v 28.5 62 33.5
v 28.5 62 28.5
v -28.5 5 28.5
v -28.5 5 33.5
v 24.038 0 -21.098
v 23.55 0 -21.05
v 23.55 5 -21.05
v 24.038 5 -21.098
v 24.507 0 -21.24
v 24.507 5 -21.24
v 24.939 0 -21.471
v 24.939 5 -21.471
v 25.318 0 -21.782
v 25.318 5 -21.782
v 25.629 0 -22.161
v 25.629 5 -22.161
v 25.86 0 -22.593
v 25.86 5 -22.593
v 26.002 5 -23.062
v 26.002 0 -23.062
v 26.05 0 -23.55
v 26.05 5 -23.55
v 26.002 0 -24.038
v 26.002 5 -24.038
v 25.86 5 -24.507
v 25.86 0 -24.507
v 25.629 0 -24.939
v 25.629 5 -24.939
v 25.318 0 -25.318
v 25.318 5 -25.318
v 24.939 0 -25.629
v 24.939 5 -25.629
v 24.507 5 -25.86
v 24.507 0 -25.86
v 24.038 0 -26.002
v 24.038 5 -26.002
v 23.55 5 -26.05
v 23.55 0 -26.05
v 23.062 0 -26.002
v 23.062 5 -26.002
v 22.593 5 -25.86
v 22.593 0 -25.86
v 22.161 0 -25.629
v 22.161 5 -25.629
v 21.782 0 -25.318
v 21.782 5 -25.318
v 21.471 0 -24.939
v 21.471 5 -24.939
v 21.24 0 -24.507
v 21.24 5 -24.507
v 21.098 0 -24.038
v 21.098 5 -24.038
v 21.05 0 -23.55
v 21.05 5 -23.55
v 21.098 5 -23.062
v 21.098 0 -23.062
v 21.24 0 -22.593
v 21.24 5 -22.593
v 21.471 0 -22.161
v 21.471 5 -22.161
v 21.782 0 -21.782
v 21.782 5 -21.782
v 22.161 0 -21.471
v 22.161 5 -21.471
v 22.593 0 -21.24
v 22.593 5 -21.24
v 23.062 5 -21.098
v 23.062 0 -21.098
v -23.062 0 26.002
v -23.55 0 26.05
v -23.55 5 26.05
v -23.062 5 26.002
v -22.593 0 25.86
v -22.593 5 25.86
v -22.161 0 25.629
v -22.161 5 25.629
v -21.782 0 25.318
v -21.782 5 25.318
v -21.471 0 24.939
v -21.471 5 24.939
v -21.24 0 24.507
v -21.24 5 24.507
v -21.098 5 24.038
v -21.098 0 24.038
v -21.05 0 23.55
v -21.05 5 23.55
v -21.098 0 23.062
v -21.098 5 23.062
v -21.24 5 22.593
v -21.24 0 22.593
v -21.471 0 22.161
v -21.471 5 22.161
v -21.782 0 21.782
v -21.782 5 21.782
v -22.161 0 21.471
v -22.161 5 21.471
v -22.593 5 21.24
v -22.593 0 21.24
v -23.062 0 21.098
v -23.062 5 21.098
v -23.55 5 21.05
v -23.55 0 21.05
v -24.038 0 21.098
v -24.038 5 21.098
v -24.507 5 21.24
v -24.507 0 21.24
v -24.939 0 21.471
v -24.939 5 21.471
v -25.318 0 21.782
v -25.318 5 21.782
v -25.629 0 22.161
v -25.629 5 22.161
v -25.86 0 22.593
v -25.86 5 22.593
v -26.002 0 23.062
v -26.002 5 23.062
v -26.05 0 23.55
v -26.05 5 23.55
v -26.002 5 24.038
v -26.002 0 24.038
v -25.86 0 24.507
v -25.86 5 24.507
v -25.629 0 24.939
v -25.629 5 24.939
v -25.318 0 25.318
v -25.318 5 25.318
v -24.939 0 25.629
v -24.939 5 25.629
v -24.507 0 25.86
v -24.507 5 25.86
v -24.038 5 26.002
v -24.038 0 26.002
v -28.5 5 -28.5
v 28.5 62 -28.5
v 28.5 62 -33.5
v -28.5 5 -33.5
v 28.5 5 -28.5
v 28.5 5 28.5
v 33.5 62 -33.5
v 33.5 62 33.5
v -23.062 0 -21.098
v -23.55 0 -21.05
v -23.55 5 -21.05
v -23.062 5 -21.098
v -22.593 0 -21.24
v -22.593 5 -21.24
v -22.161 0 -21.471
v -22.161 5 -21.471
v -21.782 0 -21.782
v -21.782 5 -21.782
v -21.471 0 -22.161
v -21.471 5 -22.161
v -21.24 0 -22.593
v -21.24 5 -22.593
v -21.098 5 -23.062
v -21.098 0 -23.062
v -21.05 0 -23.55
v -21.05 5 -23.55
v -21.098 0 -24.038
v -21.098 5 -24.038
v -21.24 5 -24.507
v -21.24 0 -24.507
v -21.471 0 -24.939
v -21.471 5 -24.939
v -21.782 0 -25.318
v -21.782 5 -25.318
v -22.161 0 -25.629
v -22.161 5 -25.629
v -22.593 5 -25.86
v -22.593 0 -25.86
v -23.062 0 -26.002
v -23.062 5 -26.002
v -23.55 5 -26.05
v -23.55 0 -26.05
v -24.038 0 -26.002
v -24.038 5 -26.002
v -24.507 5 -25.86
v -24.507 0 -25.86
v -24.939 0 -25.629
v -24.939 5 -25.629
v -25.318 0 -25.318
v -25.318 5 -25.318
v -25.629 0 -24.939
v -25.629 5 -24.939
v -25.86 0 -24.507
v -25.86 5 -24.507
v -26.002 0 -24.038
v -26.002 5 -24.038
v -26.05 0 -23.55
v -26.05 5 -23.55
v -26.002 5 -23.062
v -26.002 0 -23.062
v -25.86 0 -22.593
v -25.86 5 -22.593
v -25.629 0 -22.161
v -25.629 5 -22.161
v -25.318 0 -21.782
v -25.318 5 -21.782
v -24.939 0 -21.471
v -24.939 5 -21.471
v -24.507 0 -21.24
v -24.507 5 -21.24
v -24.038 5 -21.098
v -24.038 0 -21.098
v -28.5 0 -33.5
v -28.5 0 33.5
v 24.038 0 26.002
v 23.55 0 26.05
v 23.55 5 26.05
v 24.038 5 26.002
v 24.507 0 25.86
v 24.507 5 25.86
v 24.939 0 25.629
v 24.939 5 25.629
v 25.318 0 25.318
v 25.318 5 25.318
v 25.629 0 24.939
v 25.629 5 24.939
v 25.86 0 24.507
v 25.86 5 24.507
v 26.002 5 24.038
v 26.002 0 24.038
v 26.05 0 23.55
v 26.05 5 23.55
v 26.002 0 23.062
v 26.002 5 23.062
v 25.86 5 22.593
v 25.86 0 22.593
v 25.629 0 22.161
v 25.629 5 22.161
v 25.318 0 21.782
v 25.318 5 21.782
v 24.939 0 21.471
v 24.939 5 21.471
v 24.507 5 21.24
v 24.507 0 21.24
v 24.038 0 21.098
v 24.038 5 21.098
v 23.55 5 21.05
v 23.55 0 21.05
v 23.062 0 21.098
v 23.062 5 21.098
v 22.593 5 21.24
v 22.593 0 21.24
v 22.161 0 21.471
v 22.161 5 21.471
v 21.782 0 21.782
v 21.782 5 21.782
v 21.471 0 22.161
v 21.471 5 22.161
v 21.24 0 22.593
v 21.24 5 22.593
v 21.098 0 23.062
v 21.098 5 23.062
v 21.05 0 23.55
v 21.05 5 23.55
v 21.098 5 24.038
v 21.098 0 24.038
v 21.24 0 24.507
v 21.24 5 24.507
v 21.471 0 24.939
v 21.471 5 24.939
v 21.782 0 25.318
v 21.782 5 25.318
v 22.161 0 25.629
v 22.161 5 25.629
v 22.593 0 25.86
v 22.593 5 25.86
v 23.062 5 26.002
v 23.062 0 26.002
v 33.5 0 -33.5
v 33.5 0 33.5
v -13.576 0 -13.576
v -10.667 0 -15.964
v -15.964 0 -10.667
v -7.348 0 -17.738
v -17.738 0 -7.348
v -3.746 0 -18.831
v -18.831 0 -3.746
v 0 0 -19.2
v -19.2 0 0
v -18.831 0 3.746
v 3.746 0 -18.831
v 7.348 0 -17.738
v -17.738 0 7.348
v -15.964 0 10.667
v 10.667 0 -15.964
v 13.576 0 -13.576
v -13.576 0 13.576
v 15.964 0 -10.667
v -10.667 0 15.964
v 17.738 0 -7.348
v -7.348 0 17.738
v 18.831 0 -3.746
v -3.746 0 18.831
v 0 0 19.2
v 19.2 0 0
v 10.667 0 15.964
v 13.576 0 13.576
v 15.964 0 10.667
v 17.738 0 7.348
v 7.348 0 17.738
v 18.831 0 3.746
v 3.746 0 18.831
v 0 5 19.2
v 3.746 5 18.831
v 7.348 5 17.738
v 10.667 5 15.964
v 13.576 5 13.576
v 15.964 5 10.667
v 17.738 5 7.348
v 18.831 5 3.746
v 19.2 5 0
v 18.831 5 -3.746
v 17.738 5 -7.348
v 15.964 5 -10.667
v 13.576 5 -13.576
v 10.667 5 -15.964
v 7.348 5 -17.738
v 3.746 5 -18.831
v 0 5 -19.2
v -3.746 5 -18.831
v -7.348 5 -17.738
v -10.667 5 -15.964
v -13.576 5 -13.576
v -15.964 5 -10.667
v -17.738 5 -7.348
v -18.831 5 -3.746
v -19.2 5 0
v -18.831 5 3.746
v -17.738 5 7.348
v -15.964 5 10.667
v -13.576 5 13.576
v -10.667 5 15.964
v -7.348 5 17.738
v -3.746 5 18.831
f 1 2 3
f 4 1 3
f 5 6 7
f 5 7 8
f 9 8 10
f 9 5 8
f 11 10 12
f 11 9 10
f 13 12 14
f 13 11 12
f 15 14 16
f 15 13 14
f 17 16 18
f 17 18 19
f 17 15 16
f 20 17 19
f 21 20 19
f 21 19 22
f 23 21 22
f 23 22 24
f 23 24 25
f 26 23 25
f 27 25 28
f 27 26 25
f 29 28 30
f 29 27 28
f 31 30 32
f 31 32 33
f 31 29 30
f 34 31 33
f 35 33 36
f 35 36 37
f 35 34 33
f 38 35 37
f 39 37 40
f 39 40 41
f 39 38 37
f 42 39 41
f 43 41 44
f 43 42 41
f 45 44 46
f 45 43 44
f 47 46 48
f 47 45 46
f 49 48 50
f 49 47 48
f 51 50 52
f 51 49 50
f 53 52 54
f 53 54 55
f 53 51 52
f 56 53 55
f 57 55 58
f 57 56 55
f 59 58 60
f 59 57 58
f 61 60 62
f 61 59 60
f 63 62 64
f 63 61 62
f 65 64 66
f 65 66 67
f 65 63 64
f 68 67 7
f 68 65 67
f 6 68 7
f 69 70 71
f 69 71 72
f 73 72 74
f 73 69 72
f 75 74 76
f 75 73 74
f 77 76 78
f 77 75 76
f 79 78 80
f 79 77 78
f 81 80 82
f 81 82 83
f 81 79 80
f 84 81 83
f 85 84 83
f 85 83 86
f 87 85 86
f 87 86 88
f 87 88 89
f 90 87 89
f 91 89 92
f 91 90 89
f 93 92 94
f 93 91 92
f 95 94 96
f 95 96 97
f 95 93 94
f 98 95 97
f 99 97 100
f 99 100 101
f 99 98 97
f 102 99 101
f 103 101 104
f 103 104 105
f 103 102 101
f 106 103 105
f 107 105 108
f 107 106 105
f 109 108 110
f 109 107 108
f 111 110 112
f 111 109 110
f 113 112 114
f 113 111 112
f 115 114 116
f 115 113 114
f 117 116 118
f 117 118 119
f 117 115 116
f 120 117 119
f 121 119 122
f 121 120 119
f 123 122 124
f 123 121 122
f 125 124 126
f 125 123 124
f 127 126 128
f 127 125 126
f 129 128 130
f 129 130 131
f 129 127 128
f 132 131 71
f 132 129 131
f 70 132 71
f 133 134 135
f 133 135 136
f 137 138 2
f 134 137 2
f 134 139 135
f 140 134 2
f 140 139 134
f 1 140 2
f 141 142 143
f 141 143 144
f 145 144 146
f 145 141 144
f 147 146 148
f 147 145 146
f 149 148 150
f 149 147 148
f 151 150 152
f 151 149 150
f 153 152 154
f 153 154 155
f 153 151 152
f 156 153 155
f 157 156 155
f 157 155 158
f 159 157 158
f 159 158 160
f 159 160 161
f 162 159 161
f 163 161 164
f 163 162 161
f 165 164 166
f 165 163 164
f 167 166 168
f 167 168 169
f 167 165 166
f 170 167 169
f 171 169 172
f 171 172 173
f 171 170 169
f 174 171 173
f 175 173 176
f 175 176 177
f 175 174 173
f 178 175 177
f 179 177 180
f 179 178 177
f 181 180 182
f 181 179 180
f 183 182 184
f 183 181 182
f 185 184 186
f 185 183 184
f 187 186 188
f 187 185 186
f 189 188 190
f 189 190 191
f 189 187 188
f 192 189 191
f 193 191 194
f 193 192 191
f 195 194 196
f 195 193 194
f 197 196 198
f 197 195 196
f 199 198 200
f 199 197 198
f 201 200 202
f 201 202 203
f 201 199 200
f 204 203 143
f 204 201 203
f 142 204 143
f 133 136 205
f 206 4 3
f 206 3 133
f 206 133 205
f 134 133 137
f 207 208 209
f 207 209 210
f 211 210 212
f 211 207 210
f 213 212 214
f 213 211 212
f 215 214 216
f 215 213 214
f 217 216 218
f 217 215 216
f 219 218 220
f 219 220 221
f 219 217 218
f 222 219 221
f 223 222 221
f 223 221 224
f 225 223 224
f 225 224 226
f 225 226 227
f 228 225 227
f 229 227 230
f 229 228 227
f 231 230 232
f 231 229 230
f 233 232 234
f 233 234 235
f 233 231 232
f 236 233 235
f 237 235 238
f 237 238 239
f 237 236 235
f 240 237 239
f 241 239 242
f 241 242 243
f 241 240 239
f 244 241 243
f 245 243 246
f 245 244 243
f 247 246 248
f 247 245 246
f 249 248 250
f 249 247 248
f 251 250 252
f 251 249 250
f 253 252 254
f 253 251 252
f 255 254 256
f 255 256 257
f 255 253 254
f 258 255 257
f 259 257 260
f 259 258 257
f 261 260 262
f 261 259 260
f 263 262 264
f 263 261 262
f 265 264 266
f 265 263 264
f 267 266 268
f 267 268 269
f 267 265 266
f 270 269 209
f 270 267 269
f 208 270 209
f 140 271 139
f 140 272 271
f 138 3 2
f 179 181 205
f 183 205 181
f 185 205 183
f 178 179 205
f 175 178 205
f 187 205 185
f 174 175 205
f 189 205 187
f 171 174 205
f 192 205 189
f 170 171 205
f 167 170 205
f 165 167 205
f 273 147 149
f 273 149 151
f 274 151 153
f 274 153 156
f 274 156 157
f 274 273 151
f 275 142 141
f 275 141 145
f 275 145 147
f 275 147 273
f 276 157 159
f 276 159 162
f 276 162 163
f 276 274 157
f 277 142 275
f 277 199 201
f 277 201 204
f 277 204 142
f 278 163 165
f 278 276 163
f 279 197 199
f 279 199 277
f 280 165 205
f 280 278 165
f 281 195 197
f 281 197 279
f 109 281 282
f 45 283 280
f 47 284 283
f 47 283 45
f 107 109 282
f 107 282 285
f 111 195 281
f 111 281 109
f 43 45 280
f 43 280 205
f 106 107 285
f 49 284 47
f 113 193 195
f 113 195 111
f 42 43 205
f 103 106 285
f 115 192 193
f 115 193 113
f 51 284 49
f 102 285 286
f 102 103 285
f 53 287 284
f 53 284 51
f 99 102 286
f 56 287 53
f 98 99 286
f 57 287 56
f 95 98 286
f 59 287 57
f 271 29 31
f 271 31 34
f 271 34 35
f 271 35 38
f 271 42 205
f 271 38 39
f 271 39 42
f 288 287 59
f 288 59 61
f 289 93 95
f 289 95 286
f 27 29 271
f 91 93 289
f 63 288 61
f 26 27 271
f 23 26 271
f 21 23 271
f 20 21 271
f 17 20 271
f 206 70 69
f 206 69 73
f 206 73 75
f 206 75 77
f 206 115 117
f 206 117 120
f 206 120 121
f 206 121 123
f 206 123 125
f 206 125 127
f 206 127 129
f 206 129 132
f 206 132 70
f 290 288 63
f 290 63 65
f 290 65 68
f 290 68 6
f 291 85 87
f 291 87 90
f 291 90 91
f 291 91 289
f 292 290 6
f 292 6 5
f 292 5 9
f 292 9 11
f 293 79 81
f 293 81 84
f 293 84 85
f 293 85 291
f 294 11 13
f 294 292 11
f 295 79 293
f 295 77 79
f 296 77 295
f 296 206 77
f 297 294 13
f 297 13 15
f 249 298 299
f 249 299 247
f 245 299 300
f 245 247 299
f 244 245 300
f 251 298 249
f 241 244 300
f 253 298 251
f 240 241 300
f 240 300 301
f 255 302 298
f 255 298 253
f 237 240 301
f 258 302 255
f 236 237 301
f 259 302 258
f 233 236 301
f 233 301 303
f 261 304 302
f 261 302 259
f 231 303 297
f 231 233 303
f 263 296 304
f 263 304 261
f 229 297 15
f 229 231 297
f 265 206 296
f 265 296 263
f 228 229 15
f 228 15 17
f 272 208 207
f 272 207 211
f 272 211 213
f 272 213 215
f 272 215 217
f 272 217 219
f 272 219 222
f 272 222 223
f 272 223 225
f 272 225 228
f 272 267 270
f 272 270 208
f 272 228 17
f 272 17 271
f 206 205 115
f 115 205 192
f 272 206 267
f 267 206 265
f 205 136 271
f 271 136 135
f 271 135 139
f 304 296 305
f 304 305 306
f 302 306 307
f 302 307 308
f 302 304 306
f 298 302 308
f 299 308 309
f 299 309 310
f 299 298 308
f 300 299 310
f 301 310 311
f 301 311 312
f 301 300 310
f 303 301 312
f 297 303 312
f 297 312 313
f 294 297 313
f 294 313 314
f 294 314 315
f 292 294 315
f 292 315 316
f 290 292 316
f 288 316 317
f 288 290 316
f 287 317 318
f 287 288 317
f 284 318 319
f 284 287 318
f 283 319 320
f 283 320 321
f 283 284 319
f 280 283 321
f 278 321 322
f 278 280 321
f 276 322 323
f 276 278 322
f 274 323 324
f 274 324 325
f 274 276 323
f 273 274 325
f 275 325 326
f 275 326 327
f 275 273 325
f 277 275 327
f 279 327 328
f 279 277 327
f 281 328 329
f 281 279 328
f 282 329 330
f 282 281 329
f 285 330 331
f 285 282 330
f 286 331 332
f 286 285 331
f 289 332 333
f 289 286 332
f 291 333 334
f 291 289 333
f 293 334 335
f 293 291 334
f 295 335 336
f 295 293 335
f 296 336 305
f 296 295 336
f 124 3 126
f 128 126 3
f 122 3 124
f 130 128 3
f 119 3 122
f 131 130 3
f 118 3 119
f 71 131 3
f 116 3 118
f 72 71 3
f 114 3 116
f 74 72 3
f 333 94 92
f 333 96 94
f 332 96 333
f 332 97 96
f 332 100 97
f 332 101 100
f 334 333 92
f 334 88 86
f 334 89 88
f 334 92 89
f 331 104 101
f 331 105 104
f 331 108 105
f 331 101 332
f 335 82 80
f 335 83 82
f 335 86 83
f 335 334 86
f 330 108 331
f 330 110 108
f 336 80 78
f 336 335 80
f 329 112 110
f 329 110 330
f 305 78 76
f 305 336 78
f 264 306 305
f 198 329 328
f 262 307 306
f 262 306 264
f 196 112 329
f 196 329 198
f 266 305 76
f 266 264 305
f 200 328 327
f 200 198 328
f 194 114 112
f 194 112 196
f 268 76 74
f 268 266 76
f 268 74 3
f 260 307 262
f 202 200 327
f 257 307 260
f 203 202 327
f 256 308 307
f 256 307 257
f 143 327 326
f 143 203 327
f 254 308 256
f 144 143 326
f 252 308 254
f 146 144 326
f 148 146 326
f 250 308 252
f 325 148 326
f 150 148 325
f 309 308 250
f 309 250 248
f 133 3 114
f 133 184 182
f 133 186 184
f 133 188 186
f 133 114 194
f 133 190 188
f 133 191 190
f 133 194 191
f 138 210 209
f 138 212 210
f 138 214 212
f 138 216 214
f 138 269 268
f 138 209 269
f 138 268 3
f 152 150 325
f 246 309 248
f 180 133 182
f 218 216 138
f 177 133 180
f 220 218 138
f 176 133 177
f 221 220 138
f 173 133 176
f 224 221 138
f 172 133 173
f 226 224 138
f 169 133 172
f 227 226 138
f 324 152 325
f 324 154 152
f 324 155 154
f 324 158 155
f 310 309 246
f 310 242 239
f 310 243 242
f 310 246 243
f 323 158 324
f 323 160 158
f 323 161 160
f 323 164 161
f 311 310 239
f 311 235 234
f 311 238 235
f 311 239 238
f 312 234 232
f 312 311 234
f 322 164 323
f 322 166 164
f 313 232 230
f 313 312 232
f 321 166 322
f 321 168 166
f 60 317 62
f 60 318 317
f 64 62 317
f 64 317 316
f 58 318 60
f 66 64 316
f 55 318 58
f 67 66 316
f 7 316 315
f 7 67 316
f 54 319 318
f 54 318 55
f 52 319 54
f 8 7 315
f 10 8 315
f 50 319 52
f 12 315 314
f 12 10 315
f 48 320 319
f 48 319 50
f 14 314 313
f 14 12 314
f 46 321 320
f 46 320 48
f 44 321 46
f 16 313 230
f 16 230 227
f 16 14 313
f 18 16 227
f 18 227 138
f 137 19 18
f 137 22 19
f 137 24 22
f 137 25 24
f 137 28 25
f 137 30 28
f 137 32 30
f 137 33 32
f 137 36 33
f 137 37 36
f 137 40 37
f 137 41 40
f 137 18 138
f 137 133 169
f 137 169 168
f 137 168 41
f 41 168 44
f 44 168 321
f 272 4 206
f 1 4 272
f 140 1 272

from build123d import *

# Parameters (mm, degrees)
SKETCH1_W           = 57
SKETCH1_H           = 57
SKETCH1_R           = 2.5
SKETCH1_R_2         = 19.2
BOSS_EXTRUDE1_DEPTH = 5
SKETCH2_W           = 5
SKETCH2_H           = 62
BOSS_EXTRUDE2_DEPTH = 57
BOSS_EXTRUDE3_DEPTH = 5
BOSS_EXTRUDE4_START = -57
BOSS_EXTRUDE4_DEPTH = 5


with BuildPart() as part:
    # Sketch1 → Boss-Extrude1 (new body)
    with BuildSketch(Plane(origin=(0, 0, 0), x_dir=(1, 0, 0), z_dir=(0, 1, 0))):
        Rectangle(SKETCH1_W, SKETCH1_H)
        with Locations(Location((-23.55, 23.55, 0), (0, 0, 270))):
            Circle(SKETCH1_R, mode=Mode.SUBTRACT)
        with Locations(Location((23.55, 23.55, 0), (0, 0, 270))):
            Circle(SKETCH1_R, mode=Mode.SUBTRACT)
        with Locations(Location((23.55, -23.55, 0), (0, 0, 270))):
            Circle(SKETCH1_R, mode=Mode.SUBTRACT)
        with Locations(Location((-23.55, -23.55, 0), (0, 0, 270))):
            Circle(SKETCH1_R, mode=Mode.SUBTRACT)
        with Locations(Location((0, 0, 0), (0, 0, 270))):
            Circle(SKETCH1_R_2, mode=Mode.SUBTRACT)
    extrude(amount=BOSS_EXTRUDE1_DEPTH)

    # Sketch2 → Boss-Extrude2 (add)
    with BuildSketch(Plane.XY.offset(28.5)):
        with Locations((31, 31)):
            Rectangle(SKETCH2_W, SKETCH2_H)
    extrude(amount=-BOSS_EXTRUDE2_DEPTH)

    # Sketch3 → Boss-Extrude3 (add)
    with BuildSketch(Plane.XY.offset(28.5)):
        Polygon((28.5, 62), (-28.5, 5), (-28.5, 0), (33.5, 0), (33.5, 62), align=None)
    extrude(amount=BOSS_EXTRUDE3_DEPTH)

    # Sketch3<2> → Boss-Extrude4 (add)
    with BuildSketch(Plane.XY.offset(28.5).offset(BOSS_EXTRUDE4_START)):
        Polygon((28.5, 62), (-28.5, 5), (-28.5, 0), (33.5, 0), (33.5, 62), align=None)
    extrude(amount=-BOSS_EXTRUDE4_DEPTH)


solid = part.part
